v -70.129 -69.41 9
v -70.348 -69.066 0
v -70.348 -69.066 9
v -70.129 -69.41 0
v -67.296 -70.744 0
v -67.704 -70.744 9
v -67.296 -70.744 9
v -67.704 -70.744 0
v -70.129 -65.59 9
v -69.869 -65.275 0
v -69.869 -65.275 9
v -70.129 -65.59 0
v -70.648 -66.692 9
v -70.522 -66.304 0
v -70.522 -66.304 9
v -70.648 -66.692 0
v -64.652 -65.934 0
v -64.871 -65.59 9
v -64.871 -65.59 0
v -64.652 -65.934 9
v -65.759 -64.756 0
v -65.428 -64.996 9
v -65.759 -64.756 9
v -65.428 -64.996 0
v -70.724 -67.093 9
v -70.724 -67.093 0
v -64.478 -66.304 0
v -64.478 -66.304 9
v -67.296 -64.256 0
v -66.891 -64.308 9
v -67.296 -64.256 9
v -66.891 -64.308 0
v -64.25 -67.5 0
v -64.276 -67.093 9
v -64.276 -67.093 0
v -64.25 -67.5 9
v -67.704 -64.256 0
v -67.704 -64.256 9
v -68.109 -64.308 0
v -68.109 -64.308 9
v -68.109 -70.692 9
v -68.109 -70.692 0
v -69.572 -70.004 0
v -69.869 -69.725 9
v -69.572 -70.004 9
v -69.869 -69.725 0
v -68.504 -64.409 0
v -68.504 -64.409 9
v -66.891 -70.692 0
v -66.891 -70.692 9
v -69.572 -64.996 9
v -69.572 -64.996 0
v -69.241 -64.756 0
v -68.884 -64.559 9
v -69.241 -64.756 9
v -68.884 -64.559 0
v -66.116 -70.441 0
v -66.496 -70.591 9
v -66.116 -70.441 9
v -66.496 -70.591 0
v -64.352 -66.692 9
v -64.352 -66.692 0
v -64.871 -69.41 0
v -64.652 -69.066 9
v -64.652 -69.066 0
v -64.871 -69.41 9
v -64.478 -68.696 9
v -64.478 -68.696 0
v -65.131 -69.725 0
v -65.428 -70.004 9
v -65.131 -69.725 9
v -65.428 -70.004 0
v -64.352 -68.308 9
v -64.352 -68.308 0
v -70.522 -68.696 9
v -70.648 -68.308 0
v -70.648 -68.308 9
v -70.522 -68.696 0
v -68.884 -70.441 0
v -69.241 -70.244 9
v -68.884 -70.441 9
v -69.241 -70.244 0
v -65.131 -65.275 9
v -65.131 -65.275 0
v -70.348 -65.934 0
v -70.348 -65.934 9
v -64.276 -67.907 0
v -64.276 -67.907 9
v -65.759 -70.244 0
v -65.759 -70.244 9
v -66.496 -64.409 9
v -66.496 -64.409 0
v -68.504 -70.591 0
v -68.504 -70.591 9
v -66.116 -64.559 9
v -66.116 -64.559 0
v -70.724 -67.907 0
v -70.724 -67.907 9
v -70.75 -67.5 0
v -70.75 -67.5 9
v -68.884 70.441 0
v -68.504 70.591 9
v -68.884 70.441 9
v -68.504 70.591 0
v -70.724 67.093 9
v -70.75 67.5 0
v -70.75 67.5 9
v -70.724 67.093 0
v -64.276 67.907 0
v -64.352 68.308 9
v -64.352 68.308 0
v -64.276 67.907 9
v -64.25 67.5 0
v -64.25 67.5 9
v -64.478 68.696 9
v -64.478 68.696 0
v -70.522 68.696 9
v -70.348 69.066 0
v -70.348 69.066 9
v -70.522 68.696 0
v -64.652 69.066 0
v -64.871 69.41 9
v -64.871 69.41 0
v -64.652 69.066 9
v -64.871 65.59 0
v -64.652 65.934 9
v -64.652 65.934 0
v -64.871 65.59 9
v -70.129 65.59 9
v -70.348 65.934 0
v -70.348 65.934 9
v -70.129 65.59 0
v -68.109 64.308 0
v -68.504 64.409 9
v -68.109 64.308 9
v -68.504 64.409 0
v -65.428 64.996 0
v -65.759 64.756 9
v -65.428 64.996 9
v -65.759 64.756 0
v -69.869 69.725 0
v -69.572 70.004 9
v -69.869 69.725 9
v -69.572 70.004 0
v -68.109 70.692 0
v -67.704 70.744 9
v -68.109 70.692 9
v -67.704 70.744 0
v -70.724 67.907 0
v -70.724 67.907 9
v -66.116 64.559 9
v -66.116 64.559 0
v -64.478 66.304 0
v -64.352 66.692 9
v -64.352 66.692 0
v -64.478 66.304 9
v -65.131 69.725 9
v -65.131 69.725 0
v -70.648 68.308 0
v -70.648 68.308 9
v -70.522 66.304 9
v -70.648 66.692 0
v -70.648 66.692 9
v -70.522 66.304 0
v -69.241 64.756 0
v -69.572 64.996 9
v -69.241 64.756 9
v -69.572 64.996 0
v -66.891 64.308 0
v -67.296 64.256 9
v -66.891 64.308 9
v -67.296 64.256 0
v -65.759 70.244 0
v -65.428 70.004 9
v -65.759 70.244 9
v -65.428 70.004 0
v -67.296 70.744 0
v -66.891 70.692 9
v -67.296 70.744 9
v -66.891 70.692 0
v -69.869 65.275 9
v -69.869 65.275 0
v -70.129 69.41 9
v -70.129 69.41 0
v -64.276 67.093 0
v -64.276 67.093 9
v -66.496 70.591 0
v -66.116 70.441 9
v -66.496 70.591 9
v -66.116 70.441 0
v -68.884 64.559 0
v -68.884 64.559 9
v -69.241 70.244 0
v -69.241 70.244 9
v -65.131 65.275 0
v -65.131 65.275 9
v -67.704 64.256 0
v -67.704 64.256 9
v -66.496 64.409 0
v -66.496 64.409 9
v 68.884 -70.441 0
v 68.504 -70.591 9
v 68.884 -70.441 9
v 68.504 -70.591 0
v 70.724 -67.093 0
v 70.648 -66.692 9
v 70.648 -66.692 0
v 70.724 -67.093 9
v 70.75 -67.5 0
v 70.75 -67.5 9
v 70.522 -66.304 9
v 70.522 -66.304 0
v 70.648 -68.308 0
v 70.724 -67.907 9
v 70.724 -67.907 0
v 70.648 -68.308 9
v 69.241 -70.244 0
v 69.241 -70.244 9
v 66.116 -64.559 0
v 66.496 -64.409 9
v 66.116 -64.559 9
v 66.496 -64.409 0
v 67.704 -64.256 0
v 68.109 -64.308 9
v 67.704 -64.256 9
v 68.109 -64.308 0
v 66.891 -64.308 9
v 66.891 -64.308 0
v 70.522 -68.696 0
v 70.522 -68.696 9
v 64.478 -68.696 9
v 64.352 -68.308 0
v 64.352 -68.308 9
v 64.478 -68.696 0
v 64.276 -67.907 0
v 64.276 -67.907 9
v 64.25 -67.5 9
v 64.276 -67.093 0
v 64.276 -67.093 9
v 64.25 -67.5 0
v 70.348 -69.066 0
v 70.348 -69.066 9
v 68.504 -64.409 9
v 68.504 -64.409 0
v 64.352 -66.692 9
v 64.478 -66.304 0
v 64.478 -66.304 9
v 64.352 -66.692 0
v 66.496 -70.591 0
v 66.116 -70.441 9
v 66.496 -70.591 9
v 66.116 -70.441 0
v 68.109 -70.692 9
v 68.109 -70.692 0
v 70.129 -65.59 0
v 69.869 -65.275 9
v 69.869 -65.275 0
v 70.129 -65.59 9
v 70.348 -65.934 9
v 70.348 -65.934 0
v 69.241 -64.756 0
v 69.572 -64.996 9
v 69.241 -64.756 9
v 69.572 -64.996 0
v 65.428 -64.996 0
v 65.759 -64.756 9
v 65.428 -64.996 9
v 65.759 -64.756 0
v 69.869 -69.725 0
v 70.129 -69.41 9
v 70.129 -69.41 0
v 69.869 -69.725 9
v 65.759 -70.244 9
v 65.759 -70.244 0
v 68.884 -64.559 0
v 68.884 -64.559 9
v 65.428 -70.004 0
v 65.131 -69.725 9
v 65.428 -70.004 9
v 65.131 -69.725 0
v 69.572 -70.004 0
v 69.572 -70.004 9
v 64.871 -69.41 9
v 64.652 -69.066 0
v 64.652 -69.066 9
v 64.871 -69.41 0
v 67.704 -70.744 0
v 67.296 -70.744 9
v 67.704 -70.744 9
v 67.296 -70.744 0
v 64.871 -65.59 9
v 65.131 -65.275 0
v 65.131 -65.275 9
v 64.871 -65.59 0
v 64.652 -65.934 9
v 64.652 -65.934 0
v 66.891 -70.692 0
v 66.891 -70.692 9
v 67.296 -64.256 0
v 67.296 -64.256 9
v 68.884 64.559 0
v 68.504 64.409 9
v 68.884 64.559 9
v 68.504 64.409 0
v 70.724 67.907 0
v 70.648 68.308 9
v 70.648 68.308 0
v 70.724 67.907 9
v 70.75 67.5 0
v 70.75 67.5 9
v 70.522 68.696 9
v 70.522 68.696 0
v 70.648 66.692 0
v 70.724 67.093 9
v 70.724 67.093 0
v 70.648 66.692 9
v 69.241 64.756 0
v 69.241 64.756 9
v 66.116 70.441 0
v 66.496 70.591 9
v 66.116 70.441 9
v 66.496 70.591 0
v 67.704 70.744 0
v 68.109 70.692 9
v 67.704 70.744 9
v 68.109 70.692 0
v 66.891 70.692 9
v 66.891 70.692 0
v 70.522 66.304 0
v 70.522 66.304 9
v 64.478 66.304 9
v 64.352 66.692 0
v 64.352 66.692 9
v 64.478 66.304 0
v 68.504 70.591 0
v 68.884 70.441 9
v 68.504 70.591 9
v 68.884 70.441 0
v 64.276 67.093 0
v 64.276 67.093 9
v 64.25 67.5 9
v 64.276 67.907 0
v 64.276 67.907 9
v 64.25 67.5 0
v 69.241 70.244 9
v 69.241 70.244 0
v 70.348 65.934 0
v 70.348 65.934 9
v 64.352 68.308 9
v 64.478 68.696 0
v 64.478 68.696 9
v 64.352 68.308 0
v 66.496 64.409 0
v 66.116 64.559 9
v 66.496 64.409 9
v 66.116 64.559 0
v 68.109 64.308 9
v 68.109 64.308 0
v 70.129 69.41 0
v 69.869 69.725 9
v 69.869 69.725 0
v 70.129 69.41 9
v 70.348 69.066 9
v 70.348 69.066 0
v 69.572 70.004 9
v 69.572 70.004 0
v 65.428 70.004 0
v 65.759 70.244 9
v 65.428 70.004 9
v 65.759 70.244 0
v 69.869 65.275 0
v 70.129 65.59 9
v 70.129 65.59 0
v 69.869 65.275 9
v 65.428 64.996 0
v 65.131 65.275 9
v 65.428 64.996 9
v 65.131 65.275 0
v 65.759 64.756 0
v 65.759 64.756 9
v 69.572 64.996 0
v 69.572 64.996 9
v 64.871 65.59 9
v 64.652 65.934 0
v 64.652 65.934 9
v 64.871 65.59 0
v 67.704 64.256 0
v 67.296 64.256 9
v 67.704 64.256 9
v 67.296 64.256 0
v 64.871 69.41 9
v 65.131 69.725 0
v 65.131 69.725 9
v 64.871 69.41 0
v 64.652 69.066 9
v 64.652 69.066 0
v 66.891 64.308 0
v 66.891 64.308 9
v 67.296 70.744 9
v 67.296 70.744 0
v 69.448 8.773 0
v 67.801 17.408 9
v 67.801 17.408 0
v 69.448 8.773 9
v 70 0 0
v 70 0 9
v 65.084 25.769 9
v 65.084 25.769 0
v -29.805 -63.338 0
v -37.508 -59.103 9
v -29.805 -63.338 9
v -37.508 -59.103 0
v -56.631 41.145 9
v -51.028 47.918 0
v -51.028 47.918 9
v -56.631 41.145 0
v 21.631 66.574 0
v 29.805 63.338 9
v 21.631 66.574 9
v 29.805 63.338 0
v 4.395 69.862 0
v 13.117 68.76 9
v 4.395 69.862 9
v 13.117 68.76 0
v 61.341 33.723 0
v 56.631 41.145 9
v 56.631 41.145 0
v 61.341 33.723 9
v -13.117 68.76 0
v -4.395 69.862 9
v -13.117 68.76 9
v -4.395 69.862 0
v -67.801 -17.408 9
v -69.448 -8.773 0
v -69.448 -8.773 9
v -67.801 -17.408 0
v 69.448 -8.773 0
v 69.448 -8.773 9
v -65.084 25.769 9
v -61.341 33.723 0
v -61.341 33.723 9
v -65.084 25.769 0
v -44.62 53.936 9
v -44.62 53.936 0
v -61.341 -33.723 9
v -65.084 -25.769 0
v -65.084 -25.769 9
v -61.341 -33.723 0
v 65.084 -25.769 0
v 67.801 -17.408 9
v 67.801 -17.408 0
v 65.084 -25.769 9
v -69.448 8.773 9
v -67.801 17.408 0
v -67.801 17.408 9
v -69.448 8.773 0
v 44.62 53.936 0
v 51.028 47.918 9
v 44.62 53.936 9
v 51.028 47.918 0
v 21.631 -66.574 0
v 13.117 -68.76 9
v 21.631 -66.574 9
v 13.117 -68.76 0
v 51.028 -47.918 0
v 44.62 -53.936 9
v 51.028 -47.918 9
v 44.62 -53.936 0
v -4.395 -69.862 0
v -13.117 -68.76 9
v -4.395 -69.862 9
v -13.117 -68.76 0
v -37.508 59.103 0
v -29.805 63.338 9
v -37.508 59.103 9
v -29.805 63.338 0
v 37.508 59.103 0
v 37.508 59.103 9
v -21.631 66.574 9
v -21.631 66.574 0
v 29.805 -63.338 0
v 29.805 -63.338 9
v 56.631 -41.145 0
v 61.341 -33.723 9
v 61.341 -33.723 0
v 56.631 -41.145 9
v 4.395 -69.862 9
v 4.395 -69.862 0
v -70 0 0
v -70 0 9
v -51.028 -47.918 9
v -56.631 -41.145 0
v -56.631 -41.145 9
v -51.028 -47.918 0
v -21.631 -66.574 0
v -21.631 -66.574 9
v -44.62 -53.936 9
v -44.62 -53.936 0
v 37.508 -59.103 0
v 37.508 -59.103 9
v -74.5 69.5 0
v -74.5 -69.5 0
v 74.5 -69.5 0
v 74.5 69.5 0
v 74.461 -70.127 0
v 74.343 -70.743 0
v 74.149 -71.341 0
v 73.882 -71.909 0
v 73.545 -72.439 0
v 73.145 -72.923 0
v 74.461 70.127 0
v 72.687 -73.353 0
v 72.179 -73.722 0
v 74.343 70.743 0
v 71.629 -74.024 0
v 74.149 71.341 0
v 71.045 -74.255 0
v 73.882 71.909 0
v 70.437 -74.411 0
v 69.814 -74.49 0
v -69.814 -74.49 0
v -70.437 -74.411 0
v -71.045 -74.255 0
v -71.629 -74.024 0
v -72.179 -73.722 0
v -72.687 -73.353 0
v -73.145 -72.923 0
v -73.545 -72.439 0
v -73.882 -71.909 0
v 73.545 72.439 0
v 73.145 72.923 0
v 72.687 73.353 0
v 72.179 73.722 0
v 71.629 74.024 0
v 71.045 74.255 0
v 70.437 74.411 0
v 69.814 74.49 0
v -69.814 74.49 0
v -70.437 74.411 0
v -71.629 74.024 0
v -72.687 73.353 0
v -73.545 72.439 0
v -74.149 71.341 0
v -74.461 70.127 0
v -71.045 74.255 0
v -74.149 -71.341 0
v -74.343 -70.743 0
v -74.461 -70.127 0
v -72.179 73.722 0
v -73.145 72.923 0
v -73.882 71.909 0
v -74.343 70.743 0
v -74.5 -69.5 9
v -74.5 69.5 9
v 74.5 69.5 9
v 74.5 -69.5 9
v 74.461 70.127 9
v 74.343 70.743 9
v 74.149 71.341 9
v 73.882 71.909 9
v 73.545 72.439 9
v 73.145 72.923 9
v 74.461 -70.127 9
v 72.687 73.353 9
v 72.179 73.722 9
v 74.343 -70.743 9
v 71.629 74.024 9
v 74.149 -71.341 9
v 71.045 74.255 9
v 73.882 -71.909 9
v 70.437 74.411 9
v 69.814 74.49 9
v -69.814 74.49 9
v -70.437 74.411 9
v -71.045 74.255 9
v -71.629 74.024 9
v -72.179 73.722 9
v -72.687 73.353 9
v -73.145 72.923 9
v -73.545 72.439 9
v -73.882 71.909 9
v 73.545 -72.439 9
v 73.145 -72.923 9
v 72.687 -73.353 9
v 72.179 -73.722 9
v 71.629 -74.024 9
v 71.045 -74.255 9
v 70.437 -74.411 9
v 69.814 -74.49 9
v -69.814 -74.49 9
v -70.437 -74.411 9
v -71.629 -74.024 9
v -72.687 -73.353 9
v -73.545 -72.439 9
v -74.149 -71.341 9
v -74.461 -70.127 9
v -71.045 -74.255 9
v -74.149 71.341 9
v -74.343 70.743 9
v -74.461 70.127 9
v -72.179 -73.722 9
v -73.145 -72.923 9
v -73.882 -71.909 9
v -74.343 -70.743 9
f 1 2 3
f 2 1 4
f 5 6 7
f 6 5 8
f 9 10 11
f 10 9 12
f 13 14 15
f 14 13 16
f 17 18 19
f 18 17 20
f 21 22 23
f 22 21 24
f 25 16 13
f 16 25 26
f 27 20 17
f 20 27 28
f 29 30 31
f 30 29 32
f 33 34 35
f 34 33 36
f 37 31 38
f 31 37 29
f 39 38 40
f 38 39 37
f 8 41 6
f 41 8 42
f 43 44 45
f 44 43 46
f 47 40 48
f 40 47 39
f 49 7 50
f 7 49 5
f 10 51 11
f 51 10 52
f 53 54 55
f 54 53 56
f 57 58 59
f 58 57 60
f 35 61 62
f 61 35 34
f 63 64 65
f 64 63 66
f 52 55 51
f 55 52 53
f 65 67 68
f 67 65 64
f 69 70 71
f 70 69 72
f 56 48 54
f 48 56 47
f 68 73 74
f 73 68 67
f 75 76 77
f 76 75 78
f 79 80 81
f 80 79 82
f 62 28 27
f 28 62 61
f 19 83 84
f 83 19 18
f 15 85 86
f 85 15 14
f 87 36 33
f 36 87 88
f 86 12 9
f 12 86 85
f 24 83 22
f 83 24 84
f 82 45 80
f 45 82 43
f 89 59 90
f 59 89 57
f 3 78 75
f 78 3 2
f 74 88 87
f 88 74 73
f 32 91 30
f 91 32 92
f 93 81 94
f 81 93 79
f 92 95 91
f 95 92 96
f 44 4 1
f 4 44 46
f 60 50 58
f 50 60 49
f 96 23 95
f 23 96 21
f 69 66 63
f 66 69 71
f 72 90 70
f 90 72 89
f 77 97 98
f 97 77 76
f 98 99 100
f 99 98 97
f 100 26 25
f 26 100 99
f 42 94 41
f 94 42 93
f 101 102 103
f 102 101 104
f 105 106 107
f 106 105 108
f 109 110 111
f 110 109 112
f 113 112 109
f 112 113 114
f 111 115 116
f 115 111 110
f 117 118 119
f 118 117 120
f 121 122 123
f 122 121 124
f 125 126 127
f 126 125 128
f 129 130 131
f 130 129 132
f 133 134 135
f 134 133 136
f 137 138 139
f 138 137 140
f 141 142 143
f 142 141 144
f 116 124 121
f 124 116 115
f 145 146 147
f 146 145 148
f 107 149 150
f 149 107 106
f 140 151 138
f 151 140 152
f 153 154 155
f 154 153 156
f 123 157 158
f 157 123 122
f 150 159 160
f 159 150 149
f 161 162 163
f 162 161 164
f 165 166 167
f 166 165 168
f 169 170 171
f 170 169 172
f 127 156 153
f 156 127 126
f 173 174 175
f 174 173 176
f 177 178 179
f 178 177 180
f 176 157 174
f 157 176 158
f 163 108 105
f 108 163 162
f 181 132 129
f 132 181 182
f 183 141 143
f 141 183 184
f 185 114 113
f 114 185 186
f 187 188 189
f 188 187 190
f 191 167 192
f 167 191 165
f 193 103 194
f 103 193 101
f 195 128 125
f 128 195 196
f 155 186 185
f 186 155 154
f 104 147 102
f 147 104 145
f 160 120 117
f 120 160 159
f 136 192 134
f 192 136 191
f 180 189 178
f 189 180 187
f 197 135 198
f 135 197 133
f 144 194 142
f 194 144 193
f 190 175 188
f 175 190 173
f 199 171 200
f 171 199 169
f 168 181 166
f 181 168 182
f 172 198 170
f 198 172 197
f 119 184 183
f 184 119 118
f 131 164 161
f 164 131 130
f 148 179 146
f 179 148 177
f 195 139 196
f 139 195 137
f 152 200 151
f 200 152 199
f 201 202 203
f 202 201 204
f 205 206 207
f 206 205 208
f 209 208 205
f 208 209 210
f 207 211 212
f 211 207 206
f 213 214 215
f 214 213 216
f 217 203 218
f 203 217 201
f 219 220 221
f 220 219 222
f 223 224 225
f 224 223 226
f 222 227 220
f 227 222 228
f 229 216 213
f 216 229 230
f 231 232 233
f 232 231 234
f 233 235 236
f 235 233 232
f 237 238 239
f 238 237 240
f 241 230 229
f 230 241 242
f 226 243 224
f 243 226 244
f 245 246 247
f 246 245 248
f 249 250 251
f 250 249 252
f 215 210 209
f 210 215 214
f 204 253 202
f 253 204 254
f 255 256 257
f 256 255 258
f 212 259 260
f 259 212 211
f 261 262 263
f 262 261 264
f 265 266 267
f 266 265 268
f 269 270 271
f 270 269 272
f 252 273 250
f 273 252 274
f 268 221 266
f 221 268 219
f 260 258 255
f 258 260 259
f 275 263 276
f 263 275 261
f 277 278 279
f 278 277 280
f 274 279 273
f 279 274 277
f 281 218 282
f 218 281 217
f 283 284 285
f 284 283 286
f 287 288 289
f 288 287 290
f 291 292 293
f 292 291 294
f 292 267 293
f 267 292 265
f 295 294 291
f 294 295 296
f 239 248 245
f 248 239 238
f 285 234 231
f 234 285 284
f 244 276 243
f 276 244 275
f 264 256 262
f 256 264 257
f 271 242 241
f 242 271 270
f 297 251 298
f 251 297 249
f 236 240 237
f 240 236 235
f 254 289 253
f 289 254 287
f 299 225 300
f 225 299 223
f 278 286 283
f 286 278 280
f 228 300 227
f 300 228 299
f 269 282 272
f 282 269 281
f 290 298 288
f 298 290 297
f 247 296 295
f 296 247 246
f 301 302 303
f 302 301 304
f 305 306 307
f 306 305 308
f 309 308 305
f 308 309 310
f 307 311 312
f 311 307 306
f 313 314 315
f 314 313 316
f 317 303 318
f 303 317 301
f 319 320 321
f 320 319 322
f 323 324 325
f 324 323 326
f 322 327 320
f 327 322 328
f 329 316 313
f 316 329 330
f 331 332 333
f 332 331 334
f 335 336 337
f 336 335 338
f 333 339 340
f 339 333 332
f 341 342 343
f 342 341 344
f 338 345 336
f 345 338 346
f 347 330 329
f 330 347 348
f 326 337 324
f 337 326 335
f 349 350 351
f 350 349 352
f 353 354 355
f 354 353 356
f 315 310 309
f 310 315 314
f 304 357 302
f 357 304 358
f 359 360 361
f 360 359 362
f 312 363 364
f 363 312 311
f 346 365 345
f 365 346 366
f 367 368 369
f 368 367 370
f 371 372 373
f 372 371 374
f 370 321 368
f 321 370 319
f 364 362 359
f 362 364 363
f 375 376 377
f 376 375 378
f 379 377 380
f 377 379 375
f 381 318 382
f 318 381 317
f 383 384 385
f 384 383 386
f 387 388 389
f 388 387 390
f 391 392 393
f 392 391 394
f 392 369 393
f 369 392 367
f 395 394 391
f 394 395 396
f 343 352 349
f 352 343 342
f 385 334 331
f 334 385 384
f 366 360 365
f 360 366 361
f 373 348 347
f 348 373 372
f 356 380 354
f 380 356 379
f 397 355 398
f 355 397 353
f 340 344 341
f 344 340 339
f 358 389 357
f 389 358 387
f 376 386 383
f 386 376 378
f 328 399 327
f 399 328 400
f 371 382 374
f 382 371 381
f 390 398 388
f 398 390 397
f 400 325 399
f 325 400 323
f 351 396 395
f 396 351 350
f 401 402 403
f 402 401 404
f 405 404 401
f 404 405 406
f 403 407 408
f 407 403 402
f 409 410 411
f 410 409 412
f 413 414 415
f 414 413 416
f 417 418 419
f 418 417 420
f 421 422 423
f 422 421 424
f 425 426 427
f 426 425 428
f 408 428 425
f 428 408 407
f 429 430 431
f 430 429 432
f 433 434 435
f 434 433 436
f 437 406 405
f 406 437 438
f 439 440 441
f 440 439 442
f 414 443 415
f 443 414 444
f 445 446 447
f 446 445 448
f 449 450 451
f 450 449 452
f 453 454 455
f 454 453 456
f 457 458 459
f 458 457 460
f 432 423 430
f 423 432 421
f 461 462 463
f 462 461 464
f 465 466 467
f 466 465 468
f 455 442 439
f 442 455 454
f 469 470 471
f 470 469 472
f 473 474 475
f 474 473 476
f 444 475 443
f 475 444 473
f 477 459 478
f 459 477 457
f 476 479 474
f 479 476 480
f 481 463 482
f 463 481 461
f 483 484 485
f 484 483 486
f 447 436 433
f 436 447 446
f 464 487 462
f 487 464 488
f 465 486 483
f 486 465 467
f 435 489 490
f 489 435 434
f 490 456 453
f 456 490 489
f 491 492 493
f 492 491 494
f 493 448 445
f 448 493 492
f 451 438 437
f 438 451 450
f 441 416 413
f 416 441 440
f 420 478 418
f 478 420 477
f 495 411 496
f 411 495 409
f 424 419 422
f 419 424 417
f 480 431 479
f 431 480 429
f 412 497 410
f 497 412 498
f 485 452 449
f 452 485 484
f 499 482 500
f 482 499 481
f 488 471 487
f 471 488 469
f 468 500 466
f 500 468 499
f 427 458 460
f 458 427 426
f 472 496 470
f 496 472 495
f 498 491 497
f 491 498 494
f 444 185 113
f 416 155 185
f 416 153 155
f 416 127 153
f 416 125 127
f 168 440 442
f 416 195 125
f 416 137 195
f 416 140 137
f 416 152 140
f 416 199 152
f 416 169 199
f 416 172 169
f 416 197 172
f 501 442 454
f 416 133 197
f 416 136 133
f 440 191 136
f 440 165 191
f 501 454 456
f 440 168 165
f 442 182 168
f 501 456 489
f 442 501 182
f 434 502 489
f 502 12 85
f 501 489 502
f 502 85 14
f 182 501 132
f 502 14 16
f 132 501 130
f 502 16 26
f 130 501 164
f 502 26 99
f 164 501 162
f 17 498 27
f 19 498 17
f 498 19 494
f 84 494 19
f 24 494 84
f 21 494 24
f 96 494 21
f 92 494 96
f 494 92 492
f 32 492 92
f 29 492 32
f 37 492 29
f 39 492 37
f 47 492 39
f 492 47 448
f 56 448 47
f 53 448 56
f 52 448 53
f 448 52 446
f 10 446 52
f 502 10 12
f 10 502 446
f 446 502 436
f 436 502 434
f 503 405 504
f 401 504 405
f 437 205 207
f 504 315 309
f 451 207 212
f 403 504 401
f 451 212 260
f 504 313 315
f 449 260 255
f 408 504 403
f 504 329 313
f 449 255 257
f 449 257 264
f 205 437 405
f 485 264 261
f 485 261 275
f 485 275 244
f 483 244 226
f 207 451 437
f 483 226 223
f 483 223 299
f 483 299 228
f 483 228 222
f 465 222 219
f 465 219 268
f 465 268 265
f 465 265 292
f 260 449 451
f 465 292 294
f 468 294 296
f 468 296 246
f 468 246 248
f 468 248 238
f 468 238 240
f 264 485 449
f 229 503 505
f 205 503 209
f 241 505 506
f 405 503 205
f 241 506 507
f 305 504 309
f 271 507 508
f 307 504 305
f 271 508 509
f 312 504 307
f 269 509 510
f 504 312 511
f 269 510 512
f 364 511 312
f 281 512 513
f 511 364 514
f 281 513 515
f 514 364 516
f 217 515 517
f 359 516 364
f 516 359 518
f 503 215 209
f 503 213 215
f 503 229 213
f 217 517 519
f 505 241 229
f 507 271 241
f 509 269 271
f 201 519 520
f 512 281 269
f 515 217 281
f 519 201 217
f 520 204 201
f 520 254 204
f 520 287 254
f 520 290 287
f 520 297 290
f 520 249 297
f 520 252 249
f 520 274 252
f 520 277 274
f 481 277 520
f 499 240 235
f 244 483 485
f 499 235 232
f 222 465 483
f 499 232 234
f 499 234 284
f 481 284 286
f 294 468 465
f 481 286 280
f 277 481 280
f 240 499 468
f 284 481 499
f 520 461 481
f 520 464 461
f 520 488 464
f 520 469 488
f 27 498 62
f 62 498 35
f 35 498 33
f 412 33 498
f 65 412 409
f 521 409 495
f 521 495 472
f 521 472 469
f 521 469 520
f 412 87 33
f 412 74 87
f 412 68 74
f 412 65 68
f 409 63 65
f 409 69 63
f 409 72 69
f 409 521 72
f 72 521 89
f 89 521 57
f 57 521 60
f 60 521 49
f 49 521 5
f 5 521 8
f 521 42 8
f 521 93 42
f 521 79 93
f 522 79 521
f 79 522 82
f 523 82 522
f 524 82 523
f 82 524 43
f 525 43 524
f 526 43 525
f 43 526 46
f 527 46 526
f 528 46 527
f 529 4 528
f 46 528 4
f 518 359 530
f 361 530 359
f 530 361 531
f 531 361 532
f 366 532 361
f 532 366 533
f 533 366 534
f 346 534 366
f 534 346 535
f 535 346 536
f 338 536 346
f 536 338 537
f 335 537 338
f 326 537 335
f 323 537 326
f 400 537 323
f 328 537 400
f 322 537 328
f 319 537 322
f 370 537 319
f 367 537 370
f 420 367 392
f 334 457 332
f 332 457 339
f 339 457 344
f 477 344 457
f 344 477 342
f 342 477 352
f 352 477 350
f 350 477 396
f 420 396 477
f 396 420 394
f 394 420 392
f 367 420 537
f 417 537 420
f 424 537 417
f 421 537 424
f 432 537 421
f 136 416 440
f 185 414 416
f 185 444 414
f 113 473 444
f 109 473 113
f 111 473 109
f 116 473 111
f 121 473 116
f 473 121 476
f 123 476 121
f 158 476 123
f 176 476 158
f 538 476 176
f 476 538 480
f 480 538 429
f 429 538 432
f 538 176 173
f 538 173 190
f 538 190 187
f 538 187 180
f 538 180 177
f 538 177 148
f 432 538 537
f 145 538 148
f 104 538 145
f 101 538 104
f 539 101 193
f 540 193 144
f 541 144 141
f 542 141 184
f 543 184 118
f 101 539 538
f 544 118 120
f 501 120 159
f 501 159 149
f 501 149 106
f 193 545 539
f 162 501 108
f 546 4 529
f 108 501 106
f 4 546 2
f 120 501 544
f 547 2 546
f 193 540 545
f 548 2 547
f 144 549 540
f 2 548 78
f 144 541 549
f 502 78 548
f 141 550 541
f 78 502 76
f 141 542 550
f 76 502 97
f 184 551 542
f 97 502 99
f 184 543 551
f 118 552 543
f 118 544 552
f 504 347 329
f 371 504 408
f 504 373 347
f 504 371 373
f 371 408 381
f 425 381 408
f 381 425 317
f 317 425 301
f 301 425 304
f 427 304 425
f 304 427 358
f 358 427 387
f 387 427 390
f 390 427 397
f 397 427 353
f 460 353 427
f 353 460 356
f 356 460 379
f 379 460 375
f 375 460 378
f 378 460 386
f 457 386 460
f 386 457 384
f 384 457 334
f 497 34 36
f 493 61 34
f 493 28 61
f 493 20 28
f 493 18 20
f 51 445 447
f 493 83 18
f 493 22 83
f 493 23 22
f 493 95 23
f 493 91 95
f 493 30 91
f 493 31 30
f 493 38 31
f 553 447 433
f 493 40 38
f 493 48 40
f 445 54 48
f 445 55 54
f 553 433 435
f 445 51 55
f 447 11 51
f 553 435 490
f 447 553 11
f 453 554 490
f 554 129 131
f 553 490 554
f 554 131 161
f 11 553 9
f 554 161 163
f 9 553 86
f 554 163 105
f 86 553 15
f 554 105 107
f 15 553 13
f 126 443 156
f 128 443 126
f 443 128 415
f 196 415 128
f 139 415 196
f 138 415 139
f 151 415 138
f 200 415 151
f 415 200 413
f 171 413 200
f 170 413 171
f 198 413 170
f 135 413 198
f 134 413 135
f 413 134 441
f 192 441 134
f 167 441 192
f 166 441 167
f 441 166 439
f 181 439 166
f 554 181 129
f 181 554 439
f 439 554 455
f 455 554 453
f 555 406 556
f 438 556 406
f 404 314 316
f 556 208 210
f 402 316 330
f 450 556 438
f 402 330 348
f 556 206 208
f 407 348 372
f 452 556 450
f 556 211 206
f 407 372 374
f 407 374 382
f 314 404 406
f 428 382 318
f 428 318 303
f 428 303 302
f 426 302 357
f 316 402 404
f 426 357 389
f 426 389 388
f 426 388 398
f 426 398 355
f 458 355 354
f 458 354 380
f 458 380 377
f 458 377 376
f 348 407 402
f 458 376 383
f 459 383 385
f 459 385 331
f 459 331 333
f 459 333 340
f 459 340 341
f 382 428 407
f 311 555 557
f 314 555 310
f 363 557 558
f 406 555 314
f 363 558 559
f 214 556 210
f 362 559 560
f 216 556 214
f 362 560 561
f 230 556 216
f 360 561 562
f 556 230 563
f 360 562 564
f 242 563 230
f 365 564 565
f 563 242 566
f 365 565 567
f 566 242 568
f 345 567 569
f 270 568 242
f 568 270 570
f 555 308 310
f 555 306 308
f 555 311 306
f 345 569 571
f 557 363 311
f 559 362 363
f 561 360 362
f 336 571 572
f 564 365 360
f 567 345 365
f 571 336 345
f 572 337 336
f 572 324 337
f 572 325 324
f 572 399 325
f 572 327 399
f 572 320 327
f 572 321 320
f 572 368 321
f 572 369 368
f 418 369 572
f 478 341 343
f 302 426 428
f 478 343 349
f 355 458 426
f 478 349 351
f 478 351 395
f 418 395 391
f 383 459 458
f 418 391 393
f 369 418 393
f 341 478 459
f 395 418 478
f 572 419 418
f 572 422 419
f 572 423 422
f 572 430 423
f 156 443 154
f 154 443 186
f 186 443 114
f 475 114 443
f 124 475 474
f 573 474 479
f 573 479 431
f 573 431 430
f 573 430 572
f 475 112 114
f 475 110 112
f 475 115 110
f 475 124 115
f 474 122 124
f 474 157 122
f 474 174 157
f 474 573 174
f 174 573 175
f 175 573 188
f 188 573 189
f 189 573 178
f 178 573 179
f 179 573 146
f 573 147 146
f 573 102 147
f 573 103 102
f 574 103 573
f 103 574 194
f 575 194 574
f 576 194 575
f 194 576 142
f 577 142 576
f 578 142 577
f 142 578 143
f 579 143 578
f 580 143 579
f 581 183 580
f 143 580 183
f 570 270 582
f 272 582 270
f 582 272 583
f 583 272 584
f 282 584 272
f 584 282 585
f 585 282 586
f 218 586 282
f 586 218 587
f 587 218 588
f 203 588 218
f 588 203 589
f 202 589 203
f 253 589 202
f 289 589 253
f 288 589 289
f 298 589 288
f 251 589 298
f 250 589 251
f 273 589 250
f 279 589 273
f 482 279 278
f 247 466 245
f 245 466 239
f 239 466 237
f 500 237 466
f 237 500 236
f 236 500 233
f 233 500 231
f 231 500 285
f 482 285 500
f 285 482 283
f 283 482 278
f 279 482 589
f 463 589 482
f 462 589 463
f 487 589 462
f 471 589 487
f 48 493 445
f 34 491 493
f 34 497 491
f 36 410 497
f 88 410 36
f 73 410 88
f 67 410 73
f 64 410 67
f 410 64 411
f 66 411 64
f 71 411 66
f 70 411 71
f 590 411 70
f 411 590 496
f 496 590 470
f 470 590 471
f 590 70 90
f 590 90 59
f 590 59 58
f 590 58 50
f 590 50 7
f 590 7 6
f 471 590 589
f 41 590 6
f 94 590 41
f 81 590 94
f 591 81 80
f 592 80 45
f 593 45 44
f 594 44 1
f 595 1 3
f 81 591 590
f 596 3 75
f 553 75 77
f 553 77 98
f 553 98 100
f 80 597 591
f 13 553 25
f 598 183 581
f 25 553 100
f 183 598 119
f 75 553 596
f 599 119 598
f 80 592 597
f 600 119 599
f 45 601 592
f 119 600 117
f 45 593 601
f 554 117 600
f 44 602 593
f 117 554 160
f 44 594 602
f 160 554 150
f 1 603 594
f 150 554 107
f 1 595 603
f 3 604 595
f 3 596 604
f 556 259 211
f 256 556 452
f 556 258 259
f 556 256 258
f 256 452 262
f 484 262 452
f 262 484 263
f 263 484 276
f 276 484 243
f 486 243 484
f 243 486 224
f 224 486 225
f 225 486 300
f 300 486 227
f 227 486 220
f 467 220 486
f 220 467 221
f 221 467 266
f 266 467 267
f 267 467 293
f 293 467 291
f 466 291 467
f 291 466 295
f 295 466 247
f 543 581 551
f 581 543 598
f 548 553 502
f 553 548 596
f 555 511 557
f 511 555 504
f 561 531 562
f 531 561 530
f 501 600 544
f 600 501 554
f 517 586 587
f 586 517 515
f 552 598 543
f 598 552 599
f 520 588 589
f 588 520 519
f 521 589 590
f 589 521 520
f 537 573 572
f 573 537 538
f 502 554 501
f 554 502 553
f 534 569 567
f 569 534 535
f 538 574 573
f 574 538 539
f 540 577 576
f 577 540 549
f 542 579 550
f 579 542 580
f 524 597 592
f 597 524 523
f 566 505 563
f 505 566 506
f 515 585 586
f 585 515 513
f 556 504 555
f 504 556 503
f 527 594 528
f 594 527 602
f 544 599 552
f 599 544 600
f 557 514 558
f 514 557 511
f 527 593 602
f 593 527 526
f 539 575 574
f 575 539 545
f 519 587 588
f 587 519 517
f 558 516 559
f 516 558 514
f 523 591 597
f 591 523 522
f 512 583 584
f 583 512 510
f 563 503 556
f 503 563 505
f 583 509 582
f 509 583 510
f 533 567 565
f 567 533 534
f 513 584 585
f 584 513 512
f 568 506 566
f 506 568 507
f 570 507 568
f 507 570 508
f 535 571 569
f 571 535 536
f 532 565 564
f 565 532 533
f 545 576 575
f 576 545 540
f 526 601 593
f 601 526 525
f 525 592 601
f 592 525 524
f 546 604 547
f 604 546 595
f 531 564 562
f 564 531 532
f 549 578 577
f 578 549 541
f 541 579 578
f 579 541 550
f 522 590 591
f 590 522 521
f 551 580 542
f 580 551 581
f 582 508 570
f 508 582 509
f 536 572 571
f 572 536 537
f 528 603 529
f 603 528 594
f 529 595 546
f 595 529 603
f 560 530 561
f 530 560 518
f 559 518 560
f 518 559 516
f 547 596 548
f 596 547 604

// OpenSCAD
$fn = 50;


difference() {
	union() {
		hull() {
			translate(v = [-69.5000000000, 69.5000000000, 0]) {
				cylinder(h = 9, r = 5);
			}
			translate(v = [69.5000000000, 69.5000000000, 0]) {
				cylinder(h = 9, r = 5);
			}
			translate(v = [-69.5000000000, -69.5000000000, 0]) {
				cylinder(h = 9, r = 5);
			}
			translate(v = [69.5000000000, -69.5000000000, 0]) {
				cylinder(h = 9, r = 5);
			}
		}
	}
	union() {
		#translate(v = [-67.5000000000, -67.5000000000, -100.0000000000]) {
			cylinder(h = 200, r = 3.2500000000);
		}
		#translate(v = [-67.5000000000, 67.5000000000, -100.0000000000]) {
			cylinder(h = 200, r = 3.2500000000);
		}
		#translate(v = [67.5000000000, -67.5000000000, -100.0000000000]) {
			cylinder(h = 200, r = 3.2500000000);
		}
		#translate(v = [67.5000000000, 67.5000000000, -100.0000000000]) {
			cylinder(h = 200, r = 3.2500000000);
		}
		#cylinder(h = 9, r = 70.0000000000);
	}
}
